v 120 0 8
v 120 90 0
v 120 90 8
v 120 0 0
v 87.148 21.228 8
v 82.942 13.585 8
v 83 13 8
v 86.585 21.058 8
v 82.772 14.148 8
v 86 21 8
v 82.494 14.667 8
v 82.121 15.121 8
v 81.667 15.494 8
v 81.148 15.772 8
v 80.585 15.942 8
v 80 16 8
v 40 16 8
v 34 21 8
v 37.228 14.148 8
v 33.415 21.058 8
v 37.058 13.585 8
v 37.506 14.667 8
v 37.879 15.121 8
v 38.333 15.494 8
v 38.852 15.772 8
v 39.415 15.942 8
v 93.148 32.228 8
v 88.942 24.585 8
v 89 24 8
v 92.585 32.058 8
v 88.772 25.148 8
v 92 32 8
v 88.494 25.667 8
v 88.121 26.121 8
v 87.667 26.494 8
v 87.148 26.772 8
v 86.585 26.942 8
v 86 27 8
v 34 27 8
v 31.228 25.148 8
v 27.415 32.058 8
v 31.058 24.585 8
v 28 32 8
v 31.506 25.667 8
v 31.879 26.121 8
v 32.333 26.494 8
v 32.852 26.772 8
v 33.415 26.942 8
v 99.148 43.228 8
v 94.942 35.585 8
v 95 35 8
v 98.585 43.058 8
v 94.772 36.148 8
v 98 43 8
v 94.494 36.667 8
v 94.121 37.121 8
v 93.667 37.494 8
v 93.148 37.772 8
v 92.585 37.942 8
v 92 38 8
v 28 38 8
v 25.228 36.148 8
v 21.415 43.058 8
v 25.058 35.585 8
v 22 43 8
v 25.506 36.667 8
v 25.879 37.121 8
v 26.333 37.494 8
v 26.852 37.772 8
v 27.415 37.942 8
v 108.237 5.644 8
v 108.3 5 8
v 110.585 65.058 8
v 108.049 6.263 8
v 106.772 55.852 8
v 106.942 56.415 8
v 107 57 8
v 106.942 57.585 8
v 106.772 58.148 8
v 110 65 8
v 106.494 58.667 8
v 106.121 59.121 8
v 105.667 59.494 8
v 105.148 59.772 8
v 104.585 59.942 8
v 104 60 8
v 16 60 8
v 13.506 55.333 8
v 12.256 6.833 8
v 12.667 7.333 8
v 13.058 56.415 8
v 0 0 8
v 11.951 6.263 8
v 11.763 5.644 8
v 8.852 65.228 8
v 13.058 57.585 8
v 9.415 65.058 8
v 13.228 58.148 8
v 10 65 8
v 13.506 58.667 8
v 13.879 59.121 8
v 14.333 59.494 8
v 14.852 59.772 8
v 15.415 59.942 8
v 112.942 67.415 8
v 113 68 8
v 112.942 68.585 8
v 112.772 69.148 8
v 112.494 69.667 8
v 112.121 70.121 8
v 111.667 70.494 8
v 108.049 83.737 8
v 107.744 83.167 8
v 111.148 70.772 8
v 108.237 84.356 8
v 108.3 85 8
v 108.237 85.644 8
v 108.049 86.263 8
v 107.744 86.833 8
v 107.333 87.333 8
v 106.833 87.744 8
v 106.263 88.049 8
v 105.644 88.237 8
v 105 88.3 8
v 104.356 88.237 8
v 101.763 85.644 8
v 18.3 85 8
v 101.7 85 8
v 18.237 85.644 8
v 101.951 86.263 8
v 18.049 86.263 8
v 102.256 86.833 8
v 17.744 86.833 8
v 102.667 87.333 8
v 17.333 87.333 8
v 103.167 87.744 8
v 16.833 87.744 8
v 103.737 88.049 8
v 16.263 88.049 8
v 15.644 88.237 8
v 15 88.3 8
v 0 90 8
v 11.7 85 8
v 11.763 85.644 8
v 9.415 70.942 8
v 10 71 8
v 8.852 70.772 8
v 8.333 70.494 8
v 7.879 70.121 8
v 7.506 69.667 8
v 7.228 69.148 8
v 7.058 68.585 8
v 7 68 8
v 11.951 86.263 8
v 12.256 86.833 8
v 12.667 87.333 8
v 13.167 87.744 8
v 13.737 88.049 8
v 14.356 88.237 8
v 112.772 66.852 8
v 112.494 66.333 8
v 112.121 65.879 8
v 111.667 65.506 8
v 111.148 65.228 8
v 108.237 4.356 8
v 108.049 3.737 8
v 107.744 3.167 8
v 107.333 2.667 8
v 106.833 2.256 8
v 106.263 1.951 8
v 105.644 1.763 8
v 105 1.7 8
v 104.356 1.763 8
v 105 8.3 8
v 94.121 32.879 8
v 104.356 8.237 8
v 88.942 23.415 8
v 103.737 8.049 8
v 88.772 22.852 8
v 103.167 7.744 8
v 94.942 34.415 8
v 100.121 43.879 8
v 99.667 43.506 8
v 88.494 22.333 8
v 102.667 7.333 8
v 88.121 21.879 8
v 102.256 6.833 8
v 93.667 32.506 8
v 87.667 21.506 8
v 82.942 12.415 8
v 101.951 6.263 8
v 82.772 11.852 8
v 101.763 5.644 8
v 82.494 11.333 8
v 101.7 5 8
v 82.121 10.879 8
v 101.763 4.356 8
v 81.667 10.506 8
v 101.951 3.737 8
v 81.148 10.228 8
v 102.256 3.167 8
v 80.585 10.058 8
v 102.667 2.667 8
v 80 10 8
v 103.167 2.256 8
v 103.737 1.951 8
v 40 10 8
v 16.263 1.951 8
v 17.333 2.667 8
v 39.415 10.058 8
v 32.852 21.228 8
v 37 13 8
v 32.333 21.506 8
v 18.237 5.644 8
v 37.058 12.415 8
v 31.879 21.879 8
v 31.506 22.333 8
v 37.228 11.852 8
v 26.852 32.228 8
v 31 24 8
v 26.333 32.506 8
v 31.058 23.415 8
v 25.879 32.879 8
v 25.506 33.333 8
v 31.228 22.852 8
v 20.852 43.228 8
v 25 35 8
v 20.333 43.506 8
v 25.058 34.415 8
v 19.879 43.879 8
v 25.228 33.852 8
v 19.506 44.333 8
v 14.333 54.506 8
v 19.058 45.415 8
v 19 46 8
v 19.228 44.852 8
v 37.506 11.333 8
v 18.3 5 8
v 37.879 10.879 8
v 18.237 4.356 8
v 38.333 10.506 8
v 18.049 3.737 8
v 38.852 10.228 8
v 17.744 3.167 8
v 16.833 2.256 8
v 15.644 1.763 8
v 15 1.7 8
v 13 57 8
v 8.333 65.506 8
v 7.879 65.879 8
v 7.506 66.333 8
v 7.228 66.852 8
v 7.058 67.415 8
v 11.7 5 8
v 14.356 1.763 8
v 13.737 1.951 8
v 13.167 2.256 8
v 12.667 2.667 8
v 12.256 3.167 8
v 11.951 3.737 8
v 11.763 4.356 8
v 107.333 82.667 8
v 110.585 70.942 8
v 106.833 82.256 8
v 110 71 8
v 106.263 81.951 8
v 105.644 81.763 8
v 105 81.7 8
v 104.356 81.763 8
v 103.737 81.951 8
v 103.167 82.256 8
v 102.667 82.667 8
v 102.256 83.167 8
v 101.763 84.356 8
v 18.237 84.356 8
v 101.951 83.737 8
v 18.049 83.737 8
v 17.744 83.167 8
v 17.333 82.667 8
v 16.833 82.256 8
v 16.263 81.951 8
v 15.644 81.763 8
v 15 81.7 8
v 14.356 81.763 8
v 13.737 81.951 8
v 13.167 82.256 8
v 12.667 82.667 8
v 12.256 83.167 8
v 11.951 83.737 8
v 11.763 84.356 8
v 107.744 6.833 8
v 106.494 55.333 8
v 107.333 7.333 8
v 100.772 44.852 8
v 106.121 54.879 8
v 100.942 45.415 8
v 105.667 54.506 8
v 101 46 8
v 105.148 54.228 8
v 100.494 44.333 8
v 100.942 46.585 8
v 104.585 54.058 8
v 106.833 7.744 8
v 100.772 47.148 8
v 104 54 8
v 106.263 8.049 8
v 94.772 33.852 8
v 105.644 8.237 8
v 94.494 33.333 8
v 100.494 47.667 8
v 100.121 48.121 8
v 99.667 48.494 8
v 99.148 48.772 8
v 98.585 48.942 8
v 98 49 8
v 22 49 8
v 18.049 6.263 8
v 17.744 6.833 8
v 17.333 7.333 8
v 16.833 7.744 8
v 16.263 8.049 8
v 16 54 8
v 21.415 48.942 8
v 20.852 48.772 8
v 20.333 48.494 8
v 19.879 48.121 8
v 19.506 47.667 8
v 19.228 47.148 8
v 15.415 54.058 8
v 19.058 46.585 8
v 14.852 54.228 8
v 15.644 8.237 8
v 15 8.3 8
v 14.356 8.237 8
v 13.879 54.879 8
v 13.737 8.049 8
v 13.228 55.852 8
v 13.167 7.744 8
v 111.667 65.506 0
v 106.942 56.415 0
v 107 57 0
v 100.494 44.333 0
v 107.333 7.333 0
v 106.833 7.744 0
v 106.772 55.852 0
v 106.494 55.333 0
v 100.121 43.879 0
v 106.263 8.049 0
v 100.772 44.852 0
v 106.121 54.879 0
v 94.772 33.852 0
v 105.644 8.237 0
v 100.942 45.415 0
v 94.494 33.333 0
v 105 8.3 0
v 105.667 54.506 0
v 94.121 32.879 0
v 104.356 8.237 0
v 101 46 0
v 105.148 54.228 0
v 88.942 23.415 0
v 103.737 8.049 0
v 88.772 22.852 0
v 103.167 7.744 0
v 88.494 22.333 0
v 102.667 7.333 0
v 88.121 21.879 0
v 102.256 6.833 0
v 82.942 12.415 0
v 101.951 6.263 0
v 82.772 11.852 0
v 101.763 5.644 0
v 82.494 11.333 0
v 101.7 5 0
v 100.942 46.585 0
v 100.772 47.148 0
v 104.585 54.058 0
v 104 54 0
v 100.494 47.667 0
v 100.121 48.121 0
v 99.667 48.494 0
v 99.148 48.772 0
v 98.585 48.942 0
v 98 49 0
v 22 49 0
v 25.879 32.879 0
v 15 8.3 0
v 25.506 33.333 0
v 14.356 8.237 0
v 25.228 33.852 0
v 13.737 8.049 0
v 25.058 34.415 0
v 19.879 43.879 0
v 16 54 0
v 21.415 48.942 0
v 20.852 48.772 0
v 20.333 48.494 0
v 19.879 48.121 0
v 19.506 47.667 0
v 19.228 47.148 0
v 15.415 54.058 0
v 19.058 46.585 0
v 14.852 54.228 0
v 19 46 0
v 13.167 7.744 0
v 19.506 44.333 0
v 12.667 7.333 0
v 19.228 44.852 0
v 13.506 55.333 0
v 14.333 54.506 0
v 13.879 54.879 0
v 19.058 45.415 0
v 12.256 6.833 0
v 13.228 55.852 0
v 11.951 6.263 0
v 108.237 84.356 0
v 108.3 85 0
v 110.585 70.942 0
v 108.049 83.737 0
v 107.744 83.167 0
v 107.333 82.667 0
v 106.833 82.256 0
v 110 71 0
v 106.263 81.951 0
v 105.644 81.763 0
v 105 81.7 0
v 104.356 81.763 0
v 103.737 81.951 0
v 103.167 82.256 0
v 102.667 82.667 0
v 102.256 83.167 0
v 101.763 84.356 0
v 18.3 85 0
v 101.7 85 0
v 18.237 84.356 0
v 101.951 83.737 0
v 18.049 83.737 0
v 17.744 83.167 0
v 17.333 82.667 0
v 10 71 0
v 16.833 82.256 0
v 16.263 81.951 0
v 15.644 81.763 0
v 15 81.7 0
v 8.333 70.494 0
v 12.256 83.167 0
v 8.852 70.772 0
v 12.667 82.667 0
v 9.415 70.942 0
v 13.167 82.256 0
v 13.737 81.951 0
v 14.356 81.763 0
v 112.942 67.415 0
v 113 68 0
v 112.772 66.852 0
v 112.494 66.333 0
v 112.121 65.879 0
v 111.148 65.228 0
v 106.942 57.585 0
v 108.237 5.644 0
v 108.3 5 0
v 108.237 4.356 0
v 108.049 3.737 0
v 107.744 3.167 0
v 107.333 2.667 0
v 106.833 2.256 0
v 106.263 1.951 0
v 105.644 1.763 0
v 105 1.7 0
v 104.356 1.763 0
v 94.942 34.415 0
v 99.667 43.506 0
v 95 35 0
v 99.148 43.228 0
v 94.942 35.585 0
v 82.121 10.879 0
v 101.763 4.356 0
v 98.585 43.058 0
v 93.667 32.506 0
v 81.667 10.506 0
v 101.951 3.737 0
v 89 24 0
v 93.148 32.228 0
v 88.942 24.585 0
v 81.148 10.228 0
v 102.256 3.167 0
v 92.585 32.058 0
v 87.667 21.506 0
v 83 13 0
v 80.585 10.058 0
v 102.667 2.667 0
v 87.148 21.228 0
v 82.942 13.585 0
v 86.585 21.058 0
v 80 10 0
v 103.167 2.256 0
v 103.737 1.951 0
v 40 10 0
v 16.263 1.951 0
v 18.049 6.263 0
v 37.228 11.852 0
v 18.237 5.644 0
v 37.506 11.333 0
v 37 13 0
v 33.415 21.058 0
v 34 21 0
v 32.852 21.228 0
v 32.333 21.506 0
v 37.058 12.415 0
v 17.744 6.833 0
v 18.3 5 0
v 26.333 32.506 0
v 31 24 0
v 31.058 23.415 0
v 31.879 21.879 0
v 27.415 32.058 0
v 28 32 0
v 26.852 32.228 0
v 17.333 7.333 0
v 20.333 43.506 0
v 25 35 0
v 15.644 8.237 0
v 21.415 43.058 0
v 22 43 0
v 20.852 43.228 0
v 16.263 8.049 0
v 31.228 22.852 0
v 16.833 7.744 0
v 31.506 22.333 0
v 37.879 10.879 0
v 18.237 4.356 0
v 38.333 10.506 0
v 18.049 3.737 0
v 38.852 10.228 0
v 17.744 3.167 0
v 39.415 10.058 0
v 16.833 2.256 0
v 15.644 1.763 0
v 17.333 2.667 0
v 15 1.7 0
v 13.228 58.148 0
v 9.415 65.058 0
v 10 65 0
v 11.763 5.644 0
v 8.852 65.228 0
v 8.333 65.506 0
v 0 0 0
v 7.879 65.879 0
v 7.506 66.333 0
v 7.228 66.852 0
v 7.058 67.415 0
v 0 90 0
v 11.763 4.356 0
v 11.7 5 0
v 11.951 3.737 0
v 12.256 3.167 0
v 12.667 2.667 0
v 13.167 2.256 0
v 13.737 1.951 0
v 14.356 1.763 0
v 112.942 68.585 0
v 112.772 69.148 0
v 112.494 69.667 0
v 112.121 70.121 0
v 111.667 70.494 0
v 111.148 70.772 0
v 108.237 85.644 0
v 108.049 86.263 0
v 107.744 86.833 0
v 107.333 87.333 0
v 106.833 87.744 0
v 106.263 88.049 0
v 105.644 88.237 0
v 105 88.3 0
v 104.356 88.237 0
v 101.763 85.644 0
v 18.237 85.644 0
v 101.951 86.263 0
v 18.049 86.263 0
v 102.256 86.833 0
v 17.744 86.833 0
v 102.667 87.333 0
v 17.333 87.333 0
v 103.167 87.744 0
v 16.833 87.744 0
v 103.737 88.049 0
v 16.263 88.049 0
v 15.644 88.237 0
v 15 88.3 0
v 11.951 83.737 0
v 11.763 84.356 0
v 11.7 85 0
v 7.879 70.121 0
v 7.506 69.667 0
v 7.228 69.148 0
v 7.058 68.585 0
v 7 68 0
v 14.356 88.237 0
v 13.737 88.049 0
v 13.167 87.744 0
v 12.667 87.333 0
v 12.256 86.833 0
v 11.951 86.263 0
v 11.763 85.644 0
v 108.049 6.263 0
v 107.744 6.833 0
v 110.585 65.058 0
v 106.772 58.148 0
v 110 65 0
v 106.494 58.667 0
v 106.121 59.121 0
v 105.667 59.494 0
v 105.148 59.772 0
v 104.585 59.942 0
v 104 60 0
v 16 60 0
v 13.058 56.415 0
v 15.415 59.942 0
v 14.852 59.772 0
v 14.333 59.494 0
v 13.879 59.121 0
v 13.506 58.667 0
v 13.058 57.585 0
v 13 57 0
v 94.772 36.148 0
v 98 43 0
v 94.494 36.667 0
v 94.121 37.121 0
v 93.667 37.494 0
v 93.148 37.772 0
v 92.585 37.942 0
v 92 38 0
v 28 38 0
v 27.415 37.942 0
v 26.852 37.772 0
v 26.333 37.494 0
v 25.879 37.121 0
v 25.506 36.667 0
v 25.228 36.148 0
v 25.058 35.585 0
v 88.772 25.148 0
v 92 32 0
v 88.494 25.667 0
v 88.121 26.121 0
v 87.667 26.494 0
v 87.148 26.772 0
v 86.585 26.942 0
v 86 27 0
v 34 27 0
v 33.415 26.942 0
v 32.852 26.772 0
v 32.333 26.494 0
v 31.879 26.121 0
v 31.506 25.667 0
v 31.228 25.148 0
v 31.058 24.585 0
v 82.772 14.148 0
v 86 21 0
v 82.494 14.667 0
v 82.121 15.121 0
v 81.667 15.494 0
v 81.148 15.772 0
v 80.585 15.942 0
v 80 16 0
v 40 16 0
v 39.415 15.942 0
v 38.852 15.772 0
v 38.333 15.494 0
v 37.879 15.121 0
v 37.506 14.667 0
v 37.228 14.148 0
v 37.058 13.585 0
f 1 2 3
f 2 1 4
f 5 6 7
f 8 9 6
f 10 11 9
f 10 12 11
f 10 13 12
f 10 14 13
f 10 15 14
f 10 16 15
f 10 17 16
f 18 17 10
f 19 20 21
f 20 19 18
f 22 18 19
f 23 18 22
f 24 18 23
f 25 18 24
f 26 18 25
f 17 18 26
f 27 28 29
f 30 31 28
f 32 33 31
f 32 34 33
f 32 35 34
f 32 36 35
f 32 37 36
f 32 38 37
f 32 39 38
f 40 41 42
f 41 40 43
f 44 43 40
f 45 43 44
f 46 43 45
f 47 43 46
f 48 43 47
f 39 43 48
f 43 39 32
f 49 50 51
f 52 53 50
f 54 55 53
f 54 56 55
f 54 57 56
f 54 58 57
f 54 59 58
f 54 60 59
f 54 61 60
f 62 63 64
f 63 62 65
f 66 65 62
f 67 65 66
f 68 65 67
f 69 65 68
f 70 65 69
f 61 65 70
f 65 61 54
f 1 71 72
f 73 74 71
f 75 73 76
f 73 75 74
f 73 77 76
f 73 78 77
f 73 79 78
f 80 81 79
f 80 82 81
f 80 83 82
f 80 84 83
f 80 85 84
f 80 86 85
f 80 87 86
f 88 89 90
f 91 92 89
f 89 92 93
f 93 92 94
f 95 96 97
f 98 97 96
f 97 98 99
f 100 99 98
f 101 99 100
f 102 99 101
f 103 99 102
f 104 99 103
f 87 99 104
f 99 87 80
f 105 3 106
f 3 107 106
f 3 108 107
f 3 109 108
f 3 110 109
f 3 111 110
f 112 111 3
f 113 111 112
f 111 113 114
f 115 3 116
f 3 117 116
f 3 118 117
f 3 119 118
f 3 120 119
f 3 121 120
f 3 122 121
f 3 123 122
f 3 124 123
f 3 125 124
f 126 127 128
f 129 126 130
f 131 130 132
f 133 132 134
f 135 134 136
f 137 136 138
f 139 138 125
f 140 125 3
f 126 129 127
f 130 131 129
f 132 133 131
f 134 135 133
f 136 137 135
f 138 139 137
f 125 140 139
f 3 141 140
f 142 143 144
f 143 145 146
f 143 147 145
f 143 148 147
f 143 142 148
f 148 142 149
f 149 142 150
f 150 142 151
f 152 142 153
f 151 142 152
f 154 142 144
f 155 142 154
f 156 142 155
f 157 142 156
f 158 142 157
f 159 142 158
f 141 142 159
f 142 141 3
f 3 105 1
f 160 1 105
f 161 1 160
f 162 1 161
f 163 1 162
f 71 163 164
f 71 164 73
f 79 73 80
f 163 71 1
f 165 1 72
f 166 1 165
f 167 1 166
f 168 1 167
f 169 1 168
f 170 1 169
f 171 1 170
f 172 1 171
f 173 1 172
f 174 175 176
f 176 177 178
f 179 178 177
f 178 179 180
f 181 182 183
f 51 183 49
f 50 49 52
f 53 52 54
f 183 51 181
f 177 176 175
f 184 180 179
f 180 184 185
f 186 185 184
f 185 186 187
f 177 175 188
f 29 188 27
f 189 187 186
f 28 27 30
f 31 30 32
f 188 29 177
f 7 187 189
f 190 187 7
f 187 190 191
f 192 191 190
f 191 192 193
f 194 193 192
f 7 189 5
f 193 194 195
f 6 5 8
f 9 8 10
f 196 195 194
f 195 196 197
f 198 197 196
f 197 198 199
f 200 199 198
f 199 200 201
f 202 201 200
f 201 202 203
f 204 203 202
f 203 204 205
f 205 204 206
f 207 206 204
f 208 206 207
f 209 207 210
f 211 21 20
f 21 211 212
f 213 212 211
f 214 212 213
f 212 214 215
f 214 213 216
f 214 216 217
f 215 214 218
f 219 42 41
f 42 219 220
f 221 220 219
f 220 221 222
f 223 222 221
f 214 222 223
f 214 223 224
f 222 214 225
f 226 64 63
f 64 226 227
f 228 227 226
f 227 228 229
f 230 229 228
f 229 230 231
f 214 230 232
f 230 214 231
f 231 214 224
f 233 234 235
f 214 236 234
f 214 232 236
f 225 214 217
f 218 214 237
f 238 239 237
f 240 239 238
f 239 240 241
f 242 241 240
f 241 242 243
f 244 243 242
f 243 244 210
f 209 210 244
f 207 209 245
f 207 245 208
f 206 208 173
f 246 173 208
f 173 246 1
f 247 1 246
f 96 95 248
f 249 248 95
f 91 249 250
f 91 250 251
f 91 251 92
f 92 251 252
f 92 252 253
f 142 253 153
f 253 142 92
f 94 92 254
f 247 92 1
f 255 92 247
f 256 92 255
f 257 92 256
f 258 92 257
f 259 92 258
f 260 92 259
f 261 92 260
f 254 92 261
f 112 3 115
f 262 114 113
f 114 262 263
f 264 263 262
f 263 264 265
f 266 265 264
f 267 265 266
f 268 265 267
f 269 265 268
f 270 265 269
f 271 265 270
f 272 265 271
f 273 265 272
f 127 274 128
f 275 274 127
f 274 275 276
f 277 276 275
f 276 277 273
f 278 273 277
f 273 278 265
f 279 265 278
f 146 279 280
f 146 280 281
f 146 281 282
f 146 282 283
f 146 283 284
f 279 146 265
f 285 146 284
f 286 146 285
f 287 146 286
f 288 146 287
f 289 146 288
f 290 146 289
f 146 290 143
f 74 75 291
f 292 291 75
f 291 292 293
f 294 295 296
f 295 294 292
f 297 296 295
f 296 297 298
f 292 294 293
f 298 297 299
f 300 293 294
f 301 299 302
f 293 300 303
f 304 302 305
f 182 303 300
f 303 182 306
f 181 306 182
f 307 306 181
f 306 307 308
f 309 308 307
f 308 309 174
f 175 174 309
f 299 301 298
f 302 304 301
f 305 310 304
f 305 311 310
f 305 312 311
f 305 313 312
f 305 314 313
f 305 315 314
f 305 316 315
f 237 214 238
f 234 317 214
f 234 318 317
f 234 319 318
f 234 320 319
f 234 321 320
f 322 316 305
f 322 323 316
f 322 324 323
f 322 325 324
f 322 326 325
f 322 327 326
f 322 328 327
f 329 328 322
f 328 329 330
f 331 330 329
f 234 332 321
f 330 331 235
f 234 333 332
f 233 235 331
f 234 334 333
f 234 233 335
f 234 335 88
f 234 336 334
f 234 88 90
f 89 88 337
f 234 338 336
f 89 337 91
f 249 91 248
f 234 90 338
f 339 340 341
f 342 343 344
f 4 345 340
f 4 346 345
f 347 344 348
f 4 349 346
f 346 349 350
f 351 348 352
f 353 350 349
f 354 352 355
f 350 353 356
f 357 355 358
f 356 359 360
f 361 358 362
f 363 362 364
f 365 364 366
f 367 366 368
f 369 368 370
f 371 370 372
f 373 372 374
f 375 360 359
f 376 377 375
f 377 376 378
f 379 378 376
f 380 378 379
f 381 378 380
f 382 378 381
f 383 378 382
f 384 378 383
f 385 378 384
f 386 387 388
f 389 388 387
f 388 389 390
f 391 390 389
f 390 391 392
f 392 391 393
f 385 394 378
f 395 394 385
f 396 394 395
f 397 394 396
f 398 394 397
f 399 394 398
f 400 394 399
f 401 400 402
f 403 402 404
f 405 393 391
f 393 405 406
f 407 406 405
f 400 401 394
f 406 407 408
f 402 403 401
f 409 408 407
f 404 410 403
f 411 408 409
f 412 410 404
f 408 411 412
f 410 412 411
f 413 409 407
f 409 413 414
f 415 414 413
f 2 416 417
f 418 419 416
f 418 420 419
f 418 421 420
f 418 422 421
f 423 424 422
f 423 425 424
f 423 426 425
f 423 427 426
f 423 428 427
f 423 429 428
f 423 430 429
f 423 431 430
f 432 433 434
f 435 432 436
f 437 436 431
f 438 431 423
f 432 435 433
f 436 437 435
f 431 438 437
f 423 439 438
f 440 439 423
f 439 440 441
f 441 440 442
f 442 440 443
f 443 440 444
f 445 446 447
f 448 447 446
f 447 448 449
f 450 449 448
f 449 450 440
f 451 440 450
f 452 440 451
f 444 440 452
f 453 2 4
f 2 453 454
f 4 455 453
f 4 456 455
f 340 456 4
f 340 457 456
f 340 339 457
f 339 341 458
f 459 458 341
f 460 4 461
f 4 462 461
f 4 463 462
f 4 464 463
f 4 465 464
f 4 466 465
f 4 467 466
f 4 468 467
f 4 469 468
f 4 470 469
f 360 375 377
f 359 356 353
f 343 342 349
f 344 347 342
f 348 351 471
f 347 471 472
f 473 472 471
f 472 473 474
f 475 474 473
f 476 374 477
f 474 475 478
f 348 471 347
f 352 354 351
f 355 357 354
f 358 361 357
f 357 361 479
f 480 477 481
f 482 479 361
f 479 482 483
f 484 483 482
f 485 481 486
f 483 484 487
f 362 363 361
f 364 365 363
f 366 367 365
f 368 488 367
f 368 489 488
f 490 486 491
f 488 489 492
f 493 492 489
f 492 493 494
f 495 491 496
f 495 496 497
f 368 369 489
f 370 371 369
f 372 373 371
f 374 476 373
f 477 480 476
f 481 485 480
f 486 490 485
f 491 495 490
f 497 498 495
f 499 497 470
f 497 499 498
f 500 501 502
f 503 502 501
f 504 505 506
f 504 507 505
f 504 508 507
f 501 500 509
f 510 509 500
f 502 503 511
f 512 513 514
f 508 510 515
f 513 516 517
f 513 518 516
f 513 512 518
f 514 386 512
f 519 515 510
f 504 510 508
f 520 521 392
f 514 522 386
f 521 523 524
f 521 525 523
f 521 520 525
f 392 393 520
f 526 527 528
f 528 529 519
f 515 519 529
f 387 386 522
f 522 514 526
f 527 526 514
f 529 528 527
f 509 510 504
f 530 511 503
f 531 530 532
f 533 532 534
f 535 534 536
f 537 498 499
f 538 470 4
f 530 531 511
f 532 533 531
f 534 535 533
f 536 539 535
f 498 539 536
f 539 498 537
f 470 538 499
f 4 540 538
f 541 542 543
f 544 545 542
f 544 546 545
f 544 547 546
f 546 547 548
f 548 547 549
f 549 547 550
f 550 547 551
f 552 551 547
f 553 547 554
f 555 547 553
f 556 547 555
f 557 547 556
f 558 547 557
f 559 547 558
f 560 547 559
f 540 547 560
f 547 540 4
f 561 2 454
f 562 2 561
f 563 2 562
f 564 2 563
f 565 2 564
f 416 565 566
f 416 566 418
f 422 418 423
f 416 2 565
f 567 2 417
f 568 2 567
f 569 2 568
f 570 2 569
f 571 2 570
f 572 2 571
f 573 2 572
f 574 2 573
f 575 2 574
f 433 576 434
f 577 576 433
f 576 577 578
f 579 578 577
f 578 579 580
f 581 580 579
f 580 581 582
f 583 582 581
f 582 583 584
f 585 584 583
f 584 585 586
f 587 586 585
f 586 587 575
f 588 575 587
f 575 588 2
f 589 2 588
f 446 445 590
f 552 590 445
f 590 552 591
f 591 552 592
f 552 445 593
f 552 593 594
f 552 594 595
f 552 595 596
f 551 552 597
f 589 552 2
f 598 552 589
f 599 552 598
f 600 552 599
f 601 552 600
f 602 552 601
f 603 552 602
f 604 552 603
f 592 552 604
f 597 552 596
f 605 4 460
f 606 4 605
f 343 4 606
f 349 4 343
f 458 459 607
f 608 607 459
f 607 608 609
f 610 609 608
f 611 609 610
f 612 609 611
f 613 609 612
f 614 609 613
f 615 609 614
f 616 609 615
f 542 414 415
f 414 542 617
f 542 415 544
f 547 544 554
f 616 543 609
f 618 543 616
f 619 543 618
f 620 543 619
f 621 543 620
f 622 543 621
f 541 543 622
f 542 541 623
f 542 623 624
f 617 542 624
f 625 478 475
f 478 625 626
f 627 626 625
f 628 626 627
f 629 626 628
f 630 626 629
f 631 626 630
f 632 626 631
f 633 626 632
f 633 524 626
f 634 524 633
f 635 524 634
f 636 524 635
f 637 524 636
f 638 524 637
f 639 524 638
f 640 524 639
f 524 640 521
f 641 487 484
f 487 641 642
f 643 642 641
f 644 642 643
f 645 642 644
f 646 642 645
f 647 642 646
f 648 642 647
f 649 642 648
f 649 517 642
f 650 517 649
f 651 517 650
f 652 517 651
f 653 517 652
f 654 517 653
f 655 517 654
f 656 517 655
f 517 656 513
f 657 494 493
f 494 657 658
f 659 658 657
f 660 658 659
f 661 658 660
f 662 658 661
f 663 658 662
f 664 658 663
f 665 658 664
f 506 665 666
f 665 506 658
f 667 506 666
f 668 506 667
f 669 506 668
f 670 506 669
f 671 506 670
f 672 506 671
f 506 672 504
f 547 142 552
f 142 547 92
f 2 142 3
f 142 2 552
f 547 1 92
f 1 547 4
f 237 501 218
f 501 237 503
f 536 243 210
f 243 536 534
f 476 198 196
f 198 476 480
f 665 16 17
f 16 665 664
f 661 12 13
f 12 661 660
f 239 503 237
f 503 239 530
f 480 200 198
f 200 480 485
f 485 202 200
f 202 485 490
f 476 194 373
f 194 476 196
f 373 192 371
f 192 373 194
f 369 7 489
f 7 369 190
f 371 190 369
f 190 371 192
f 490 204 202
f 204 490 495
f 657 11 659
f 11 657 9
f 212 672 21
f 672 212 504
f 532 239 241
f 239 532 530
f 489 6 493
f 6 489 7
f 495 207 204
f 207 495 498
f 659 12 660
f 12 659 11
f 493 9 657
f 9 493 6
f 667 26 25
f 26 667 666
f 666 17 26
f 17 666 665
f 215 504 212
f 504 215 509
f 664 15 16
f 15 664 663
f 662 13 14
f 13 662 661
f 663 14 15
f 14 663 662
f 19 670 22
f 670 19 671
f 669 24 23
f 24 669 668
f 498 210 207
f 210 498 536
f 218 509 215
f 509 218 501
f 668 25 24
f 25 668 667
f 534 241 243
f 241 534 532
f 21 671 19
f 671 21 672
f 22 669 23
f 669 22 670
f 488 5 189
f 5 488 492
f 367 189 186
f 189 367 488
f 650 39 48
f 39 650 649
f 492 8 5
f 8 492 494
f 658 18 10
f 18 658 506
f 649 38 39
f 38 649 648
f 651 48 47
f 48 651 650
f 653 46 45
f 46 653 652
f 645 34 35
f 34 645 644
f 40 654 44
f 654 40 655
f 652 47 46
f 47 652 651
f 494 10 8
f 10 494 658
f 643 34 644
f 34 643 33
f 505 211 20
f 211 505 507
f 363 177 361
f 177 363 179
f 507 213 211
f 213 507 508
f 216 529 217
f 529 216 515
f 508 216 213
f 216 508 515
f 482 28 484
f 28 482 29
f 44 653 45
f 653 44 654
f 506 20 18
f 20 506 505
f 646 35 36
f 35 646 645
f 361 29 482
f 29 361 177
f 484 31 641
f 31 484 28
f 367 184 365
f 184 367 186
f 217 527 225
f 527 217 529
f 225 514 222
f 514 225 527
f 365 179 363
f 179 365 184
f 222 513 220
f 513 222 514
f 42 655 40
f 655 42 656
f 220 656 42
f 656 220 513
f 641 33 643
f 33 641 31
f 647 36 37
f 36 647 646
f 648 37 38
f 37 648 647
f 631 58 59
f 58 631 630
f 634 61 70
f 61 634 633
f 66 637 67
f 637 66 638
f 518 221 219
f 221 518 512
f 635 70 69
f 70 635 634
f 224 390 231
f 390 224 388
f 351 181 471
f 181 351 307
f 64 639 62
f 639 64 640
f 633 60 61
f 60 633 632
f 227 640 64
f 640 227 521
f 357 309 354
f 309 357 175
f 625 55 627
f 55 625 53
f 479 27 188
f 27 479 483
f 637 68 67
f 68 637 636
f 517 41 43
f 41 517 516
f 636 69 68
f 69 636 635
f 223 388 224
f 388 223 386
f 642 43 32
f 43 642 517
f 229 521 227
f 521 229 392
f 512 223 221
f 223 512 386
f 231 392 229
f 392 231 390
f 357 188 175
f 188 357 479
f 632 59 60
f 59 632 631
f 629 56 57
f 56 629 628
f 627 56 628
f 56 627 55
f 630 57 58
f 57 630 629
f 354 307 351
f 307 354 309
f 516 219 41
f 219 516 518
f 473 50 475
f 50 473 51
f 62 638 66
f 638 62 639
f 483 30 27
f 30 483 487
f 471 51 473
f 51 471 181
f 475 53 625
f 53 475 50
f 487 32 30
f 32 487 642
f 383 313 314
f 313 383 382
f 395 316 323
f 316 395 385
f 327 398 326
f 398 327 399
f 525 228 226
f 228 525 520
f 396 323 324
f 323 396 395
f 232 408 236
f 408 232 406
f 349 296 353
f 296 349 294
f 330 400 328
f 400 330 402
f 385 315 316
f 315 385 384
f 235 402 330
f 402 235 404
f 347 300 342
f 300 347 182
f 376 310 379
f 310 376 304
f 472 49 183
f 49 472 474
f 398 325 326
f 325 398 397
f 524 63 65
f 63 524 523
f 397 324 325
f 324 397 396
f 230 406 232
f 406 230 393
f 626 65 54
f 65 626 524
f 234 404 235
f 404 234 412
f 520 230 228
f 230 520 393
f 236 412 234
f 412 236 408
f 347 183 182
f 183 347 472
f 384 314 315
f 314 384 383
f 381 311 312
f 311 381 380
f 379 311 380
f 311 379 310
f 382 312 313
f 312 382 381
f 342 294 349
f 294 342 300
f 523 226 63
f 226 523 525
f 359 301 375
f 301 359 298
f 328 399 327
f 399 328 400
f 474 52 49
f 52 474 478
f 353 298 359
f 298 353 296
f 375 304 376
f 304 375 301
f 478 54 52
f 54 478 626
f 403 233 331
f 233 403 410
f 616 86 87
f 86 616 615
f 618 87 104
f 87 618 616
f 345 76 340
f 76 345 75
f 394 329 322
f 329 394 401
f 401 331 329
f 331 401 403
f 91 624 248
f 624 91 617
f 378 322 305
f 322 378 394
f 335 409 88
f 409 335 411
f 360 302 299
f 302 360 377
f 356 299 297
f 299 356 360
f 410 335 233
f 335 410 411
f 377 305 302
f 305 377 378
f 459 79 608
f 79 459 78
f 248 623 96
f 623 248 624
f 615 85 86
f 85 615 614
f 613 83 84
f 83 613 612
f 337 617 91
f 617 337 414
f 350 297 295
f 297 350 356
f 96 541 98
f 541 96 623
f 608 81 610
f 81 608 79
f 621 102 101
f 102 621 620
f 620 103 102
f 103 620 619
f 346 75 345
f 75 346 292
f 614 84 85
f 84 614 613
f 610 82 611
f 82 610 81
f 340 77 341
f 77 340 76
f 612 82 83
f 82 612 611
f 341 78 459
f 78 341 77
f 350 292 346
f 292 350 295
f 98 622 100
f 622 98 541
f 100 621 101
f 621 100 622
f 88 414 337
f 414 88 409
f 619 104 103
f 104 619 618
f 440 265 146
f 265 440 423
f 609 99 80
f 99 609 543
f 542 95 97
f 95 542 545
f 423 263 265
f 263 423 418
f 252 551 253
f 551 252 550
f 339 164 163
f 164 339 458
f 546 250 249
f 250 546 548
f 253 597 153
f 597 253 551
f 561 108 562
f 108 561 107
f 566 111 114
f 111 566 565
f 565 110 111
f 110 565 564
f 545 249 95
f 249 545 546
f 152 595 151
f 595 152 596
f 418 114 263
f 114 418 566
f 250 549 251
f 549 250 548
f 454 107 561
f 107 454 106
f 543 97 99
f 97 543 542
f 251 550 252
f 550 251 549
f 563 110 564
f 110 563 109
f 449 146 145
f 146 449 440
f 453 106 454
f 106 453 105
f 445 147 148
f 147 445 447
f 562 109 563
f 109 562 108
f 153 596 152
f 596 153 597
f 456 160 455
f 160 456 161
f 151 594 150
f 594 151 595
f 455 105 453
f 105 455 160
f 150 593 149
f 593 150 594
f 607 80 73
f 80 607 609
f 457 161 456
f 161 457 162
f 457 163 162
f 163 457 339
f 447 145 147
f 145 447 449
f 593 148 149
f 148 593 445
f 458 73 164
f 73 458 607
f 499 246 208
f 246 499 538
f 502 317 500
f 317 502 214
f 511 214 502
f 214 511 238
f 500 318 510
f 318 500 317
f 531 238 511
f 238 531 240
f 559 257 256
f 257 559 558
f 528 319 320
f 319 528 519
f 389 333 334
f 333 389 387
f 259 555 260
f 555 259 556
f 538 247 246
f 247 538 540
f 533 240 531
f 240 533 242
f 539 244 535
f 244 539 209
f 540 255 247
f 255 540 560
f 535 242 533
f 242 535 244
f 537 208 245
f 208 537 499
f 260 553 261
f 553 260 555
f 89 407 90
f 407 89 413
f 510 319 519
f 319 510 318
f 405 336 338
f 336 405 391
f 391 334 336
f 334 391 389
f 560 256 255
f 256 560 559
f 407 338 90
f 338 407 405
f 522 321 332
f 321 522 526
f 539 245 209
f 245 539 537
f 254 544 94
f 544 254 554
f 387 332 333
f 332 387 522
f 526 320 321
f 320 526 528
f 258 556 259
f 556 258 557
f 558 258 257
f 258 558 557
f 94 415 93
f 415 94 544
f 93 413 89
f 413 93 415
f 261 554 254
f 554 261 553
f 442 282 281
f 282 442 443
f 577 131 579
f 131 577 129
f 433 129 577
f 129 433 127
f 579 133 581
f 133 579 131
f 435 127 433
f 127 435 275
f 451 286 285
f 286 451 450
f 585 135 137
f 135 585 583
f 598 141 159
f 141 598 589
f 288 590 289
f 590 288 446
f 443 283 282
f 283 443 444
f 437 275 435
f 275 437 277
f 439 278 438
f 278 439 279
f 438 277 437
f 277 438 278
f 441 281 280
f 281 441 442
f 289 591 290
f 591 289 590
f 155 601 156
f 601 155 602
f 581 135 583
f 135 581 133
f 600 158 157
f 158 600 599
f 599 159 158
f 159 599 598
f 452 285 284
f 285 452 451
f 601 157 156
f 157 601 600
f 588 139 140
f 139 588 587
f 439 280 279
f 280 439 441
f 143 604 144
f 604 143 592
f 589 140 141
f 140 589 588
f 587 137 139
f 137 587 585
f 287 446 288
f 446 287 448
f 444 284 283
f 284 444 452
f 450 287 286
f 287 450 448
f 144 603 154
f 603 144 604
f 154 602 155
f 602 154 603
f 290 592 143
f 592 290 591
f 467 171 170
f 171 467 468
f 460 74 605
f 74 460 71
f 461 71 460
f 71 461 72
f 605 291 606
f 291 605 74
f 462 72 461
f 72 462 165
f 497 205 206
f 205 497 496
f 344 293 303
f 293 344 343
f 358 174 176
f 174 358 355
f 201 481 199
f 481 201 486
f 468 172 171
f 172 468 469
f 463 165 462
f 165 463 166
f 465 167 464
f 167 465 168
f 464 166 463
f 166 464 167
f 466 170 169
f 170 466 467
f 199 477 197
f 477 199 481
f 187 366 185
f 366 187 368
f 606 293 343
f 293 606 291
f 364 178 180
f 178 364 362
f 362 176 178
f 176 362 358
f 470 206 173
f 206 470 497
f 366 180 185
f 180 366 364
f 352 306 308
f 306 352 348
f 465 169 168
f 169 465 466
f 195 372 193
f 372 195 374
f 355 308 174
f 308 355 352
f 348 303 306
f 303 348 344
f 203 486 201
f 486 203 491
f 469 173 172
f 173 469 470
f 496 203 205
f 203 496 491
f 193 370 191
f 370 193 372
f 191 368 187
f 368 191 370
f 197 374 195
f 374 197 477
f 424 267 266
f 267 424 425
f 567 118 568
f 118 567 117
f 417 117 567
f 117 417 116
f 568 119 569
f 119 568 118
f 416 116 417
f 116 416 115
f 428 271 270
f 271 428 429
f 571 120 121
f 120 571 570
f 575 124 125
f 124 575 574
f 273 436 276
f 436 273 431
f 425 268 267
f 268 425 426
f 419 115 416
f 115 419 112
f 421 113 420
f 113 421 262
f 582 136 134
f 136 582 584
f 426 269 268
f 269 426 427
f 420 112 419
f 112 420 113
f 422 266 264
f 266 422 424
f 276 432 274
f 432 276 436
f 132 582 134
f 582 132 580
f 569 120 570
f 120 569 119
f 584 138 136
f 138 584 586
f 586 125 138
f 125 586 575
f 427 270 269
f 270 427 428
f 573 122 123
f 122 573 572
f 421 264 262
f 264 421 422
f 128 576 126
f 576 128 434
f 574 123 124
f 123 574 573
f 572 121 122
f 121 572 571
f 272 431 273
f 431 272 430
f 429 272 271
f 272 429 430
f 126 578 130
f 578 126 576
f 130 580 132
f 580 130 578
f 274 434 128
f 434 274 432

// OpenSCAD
$fn = 32;

// ----------------------------------------------------------------------
// Slotted panel: 120 x 90 mm, 6 рядов of slots
// ----------------------------------------------------------------------

// --- parameters (mm) ---
panel_w = 120;            // panel width
panel_d = 90;             // panel depth
thick = 8;                // panel thickness
slot_w = 6;               // slot width
pitch0 = 11;              // first row pitch
pitch_step = 2.4;         // pitch increase per row
margin = 10;              // margin around the slot field
rows = 6;                 // number of slot rows
mount_d = 6.6;            // mounting holes
mount_x = 45;             // mounting hole offset

difference() {
  union() {
    cube([panel_w, panel_d, thick]);
  }
  /* slot rows: stadium shaped cutters, 2.5 mm clear of both faces */
  /* row 0: pitch 11, length 40 */
  hull() {
    translate([40, 13, -2.5]) cylinder(h = thick + 5, d = slot_w);
    translate([80, 13, -2.5]) cylinder(h = thick + 5, d = slot_w);
  }
  /* row 1: pitch 11, length 52 */
  hull() {
    translate([34, 24, -2.5]) cylinder(h = thick + 5, d = slot_w);
    translate([86, 24, -2.5]) cylinder(h = thick + 5, d = slot_w);
  }
  /* row 2: pitch 11, length 64 */
  hull() {
    translate([28, 35, -2.5]) cylinder(h = thick + 5, d = slot_w);
    translate([92, 35, -2.5]) cylinder(h = thick + 5, d = slot_w);
  }
  /* row 3: pitch 11, length 76 */
  hull() {
    translate([22, 46, -2.5]) cylinder(h = thick + 5, d = slot_w);
    translate([98, 46, -2.5]) cylinder(h = thick + 5, d = slot_w);
  }
  /* row 4: pitch 11, length 88 */
  hull() {
    translate([16, 57, -2.5]) cylinder(h = thick + 5, d = slot_w);
    translate([104, 57, -2.5]) cylinder(h = thick + 5, d = slot_w);
  }
  /* row 5: pitch 11, length 100 */
  hull() {
    translate([10, 68, -2.5]) cylinder(h = thick + 5, d = slot_w);
    translate([110, 68, -2.5]) cylinder(h = thick + 5, d = slot_w);
  }
  translate([15, 5, -2.5]) cylinder(h = 13, d = mount_d);
  translate([15, 85, -2.5]) cylinder(h = 13, d = mount_d);
  translate([105, 5, -2.5]) cylinder(h = 13, d = mount_d);
  translate([105, 85, -2.5]) cylinder(h = 13, d = mount_d);
}
